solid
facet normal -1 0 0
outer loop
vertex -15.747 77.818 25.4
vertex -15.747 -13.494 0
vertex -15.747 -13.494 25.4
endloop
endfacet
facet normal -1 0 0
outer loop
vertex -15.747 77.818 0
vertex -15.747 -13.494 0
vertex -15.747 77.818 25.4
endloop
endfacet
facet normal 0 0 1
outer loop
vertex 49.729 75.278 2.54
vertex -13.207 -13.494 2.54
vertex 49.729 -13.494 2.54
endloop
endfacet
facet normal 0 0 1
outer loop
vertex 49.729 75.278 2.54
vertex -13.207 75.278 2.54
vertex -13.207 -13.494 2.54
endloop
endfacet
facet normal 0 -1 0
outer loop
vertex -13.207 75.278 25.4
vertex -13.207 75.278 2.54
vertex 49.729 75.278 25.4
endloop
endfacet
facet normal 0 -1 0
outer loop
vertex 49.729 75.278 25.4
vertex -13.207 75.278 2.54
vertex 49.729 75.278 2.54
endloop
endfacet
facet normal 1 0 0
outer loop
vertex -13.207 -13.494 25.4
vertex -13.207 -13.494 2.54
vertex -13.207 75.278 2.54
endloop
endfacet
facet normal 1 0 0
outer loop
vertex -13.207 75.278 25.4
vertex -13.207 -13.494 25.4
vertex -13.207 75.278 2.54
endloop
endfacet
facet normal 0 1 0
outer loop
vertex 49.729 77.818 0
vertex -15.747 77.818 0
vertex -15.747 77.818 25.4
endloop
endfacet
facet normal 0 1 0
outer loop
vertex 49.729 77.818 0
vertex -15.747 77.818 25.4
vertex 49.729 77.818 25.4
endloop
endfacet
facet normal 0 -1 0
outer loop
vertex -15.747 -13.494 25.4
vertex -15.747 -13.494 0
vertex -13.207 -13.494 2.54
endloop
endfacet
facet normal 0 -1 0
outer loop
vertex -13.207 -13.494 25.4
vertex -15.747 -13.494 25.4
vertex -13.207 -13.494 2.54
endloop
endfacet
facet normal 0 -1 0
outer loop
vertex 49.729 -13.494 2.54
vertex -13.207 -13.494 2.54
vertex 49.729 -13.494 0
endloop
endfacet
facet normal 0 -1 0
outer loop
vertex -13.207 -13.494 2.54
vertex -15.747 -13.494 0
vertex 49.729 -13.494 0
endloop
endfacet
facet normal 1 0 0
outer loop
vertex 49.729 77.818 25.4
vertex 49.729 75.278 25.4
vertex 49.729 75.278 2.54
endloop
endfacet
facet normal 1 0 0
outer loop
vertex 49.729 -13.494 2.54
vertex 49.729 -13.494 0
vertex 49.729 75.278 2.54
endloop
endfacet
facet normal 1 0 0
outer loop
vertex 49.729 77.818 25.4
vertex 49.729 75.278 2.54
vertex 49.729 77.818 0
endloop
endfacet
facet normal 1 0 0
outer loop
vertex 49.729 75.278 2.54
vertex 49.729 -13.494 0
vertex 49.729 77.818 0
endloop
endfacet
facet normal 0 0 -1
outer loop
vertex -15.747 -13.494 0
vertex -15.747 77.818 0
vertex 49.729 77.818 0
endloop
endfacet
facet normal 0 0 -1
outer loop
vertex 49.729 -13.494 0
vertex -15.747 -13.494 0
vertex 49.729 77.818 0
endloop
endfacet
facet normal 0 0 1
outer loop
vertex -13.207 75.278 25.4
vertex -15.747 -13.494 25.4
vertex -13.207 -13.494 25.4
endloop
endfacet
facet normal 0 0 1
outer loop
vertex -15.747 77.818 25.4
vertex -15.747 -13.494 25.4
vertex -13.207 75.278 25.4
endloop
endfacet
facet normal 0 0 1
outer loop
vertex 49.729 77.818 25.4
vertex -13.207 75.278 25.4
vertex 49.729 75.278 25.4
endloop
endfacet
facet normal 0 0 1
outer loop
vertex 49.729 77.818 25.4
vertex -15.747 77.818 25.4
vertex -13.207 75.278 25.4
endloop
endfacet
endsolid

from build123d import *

# Parameters (mm, degrees)
F2_W     = 65.475806
F2_H     = 91.311798
F0_DEPTH = 25.4
F1_T     = -2.54


with BuildPart() as f0:
    # F2 (on Top) → F0 (new body)
    with BuildSketch(Plane.XY):
        with Locations((16.99128, 32.161951)):
            Rectangle(F2_W, F2_H)
    extrude(amount=F0_DEPTH)

    # F1
    f1_openings = [f0.faces().sort_by_distance(p)[0] for p in [
        (49.729183, 32.161951, 12.7),
        (16.99128, -13.493948, 12.7),
        (16.99128, 32.161951, 25.4),
    ]]
    offset(amount=F1_T, openings=f1_openings)


solid = f0.part
